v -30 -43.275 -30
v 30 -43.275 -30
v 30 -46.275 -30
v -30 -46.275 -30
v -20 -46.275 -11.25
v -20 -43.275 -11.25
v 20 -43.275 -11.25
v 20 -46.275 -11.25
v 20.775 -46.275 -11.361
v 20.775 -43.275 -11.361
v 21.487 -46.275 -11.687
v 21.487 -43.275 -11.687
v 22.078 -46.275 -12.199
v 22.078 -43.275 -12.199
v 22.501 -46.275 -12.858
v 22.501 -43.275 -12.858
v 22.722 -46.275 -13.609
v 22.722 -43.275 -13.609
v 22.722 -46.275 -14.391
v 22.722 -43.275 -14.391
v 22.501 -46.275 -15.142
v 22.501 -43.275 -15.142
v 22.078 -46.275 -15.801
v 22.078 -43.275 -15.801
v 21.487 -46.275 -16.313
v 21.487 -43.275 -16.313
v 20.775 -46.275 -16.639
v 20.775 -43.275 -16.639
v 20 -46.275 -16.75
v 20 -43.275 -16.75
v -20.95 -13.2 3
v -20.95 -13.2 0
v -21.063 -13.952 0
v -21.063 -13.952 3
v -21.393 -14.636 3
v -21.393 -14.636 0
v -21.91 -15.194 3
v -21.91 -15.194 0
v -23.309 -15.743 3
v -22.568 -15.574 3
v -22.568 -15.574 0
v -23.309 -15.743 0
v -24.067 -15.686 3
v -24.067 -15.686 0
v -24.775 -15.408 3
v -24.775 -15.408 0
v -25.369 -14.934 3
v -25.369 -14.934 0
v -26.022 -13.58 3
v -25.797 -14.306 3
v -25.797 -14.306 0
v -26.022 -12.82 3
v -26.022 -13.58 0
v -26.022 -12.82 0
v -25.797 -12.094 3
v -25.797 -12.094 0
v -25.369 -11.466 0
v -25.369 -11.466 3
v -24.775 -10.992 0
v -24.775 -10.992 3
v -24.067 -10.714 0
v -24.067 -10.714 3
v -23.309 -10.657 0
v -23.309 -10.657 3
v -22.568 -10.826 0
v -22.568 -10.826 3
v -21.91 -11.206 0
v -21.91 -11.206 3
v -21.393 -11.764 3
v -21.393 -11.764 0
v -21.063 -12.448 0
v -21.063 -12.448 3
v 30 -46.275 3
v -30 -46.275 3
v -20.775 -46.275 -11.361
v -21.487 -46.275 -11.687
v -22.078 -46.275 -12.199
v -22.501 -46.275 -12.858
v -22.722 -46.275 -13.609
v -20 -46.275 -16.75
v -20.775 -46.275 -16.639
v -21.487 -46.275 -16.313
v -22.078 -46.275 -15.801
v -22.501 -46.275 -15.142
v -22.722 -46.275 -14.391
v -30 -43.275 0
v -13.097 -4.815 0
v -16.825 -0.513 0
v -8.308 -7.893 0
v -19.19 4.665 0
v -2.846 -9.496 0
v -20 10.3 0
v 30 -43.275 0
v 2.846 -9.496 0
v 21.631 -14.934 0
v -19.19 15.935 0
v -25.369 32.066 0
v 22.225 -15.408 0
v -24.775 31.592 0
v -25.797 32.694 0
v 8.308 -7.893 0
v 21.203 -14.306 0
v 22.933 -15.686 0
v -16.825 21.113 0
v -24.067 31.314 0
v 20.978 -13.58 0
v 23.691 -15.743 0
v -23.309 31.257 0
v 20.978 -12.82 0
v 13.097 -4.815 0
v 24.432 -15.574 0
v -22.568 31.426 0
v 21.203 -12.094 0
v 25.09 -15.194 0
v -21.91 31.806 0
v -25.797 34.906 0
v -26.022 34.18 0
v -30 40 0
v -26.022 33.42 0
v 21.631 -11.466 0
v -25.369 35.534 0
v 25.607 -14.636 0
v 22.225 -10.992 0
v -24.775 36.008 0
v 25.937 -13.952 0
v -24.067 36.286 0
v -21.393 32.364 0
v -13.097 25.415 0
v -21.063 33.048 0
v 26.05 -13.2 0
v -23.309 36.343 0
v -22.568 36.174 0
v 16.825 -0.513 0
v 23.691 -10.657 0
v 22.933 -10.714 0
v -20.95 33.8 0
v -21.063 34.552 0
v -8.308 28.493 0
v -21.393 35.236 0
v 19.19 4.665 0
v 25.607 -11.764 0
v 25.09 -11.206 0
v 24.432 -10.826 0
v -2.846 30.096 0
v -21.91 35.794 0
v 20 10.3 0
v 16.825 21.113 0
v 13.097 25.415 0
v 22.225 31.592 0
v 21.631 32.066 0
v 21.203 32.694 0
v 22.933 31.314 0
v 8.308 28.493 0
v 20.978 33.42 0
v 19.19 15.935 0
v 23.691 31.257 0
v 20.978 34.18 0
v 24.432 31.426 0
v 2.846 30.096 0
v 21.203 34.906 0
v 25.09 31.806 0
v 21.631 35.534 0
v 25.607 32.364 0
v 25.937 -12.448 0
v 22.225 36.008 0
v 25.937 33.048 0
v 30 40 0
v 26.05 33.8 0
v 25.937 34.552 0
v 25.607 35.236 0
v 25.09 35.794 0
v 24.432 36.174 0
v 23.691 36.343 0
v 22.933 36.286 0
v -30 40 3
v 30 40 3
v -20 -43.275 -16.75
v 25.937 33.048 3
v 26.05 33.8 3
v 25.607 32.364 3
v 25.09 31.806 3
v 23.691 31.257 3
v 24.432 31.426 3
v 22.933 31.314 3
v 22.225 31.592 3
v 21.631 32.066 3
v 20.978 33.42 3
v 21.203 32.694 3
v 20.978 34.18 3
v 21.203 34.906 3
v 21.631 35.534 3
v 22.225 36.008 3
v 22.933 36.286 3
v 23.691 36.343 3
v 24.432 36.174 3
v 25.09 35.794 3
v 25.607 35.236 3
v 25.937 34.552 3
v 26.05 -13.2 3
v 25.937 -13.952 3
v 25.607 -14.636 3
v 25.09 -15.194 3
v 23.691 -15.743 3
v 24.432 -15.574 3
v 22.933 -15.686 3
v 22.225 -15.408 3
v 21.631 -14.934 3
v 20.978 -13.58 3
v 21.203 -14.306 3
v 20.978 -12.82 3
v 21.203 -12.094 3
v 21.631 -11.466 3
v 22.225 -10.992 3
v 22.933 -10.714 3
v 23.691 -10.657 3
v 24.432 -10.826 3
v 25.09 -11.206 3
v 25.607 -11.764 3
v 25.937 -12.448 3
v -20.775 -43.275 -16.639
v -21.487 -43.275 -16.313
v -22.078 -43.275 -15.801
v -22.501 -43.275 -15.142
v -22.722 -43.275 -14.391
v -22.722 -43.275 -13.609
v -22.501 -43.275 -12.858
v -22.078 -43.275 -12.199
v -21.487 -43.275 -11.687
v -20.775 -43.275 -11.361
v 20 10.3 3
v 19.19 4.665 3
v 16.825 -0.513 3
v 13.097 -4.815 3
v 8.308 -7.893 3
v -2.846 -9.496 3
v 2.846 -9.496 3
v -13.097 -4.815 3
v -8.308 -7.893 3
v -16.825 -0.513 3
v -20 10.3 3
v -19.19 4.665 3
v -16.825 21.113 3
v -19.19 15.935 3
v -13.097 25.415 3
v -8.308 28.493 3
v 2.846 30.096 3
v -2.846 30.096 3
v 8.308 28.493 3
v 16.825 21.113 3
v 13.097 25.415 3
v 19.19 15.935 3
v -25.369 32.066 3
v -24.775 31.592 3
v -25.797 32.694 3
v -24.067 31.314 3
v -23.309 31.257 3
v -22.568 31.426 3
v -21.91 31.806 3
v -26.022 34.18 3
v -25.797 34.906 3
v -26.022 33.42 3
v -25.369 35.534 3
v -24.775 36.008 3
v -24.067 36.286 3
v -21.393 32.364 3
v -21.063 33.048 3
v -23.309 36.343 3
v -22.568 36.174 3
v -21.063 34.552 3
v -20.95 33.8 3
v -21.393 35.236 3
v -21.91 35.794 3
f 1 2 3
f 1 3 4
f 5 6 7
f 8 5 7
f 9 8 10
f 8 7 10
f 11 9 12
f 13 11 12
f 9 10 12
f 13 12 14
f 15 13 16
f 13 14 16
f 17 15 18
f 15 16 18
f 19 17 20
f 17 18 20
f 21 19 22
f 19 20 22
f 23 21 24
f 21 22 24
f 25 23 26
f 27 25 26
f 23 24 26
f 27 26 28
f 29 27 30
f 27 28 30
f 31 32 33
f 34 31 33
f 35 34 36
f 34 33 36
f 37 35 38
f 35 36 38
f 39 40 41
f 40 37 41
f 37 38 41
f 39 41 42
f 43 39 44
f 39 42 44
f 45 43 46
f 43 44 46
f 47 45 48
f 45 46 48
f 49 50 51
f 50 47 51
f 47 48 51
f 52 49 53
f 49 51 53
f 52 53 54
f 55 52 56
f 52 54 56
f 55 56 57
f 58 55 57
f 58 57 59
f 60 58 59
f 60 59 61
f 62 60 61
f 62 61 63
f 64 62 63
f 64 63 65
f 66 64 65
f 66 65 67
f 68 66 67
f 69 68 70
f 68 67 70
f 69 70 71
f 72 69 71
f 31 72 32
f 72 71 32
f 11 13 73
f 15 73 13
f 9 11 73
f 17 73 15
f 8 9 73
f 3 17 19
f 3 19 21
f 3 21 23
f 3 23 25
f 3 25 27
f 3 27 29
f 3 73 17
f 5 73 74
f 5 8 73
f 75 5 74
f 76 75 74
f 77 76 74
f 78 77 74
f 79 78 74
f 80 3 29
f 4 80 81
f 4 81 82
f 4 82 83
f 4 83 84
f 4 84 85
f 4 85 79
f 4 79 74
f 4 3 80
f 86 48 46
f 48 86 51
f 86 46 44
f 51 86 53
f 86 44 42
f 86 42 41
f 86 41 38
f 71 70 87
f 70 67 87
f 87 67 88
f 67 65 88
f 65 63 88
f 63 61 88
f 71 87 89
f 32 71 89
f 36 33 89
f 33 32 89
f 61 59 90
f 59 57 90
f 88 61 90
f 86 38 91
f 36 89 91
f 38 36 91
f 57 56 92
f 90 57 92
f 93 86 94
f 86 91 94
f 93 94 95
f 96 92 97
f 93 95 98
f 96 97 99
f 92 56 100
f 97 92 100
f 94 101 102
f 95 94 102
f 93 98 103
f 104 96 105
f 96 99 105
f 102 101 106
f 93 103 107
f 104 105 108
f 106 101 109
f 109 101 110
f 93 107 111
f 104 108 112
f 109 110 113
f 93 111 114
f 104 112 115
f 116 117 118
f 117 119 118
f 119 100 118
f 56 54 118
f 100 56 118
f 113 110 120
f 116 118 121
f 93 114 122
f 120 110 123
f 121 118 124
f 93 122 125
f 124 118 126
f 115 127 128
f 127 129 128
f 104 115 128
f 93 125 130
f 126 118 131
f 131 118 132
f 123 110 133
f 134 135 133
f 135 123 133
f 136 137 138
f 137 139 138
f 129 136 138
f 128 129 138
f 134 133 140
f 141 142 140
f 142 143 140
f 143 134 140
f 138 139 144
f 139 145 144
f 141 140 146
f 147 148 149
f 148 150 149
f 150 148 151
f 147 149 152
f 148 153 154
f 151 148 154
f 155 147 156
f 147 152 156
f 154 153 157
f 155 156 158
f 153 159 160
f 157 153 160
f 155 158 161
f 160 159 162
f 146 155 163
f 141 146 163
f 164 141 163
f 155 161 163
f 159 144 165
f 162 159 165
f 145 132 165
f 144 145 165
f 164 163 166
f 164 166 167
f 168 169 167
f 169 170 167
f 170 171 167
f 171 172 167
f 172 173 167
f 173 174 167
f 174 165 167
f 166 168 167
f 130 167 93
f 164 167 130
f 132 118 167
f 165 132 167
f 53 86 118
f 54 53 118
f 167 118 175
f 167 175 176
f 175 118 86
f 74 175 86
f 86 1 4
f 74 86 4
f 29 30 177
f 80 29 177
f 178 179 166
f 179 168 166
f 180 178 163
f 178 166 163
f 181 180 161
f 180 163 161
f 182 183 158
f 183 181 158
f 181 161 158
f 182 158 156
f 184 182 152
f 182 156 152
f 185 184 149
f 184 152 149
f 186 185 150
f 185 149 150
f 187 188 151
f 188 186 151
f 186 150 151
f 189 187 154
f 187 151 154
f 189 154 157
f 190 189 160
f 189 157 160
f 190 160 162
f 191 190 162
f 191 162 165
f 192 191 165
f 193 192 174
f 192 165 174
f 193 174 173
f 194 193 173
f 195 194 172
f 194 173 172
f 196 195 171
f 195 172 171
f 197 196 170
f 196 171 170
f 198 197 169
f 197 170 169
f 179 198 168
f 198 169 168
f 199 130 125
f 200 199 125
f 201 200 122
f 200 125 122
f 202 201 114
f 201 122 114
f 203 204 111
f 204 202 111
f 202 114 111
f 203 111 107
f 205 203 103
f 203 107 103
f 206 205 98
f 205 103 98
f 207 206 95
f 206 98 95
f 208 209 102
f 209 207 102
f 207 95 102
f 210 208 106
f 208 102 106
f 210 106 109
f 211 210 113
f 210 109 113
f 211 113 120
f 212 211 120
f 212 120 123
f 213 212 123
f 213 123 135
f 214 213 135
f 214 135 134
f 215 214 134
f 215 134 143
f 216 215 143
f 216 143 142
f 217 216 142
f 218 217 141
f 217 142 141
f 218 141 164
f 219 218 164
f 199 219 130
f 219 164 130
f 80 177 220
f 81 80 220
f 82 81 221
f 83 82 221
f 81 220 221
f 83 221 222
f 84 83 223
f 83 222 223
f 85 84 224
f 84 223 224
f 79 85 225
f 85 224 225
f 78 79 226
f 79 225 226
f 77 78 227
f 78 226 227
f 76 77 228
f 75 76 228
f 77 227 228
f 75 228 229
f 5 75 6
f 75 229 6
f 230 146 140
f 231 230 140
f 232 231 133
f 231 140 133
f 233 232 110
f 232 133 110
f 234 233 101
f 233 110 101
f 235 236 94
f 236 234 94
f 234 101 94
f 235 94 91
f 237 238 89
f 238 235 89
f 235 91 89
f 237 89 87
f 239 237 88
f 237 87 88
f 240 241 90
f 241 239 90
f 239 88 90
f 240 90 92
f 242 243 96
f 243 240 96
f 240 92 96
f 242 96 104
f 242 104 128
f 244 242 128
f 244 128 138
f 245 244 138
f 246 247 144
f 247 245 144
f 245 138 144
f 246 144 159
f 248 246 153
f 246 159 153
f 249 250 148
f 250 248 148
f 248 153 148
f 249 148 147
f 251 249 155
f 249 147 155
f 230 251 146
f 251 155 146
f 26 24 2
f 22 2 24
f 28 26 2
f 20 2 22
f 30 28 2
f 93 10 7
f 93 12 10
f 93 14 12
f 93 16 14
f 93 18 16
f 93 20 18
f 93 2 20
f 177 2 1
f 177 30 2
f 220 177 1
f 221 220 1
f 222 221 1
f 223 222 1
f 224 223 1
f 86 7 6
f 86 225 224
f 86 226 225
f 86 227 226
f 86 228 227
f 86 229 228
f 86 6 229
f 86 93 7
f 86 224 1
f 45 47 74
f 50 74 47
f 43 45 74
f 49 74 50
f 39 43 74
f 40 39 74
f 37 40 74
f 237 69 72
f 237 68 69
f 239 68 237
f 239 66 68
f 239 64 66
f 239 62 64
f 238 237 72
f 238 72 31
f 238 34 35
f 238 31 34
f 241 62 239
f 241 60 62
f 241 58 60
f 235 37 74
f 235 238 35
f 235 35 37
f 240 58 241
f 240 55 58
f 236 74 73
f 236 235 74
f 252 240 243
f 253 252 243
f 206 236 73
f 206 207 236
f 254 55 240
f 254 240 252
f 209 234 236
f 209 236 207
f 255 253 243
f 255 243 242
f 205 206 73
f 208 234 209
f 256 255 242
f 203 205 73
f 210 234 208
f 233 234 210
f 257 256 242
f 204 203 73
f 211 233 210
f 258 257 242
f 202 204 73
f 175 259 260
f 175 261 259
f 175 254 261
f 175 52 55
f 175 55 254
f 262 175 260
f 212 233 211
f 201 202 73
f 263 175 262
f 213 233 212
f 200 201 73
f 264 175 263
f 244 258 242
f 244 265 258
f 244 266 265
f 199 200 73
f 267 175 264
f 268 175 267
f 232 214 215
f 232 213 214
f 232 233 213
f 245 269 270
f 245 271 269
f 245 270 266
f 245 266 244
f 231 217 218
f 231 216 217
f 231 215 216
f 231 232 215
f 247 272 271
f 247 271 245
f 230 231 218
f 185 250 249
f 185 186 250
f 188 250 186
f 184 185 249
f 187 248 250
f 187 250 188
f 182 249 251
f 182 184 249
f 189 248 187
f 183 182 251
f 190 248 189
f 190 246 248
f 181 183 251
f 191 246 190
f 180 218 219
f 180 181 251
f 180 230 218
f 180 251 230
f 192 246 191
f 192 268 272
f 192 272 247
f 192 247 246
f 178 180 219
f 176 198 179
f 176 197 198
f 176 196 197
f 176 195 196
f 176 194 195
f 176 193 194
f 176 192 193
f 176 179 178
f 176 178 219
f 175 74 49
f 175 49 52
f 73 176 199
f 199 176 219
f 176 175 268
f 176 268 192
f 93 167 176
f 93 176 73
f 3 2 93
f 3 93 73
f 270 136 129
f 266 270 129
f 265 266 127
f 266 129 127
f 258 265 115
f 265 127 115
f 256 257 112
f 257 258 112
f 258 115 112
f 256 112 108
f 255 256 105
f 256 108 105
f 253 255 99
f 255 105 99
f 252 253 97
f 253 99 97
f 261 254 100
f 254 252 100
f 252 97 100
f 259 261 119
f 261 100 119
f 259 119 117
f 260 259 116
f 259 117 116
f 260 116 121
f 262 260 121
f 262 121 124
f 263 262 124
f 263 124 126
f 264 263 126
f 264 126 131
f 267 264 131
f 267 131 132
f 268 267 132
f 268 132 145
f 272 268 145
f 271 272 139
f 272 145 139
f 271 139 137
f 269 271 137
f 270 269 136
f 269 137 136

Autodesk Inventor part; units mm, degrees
ref_plane "YZ Plane" through (0, 0, 0) normal (1, 0, 0) x (0, 1, 0)
ref_plane "XZ Plane" through (0, 0, 0) normal (0, 1, 0) x (-1, 0, 0)
ref_plane "XY Plane" through (0, 0, 0) normal (0, 0, 1) x (1, 0, 0)
sketch "Sketch1" plane through (0, 0, 0) normal (0, 0, 1) x (1, 0, 0)
  line L0 (-30, 40) -> (30, 40)
  line L1 (0, 40) -> (0, 10.3) construction
  circle A0 centre (0, 10.3) radius 20
  line L2 (-23.5, -13.2) -> (23.5, -13.2) construction
  line L3 (23.5, -13.2) -> (23.5, 33.8) construction
  line L4 (23.5, 33.8) -> (-23.5, 33.8) construction
  line L5 (-23.5, 33.8) -> (-23.5, -13.2) construction
  line L6 (23.5, -13.2) -> (-23.5, 33.8) construction
  circle A1 centre (-23.5, 33.8) radius 2.55
  circle A2 centre (23.5, 33.8) radius 2.55
  circle A3 centre (-23.5, -13.2) radius 2.55
  circle A4 centre (23.5, -13.2) radius 2.55
  line L7 (0, -46.275) -> (-30, -46.275)
  line L8 (0, -46.275) -> (30, -46.275)
  line L9 (-30, 40) -> (-30, -46.275)
  line L10 (30, 40) -> (30, -46.275)
  point P0 (0, 0)
  dimension "d2" = 29.7
  dimension "d3" = 40
  dimension "d4" = 47
  dimension "d5" = 47
  dimension "d6" = 5.1
  dimension "d7" = 5.1
  dimension "d8" = 5.1
  dimension "d9" = 5.1
  dimension "d12" = 56.575
  dimension "d13" = 30
  dimension "d14" = 30
extrude "Extrusion1" add sketch "Sketch1" along normal blind 3
sketch "Sketch2" plane through (0, 0, 0) normal (0, 0, -1) x (-1, 0, 0)
  line L0 (30, -46.275) -> (-30, -46.275) projected
  line L1 (-30, -46.275) -> (-30, 40) projected
  line L2 (30, -46.275) -> (-30, -46.275)
  line L3 (-30, -46.275) -> (-30, -43.275)
  line L4 (-30, -43.275) -> (30, -43.275)
  line L5 (30, -43.275) -> (30, -46.275)
  point P0 (0, 0)
  dimension "d15" = 3
extrude "Extrusion2" add sketch "Sketch2" along normal blind 30
sketch "Sketch3" plane through (-30, -43.275, 0) normal (0, 1, 0) x (1, 0, 0)
  line L0 (60, -3) -> (0, -3) construction
  line L1 (30, -3) -> (30, 17.57) construction
  line L2 (30, -3) -> (30, 10.43) construction
  line L3 (30, 10.43) -> (30, 17.57) construction
  line L4 (30, 14) -> (65.9748, 14) construction
  line L5 (65.9748, 14) -> (-8.6143, 14) construction
  line L6 (10, 14) -> (50, 14) construction
  line L7 (10, 11.25) -> (50, 11.25)
  line L8 (50, 16.75) -> (10, 16.75)
  arc A0 (10, 16.75) -> (10, 11.25) centre (10, 14) ccw
  arc A1 (50, 11.25) -> (50, 16.75) centre (50, 14) ccw
  point P0 (30, 0)
  dimension "d18" = 20.57
  dimension "d19" = 13.43
  dimension "d20" = 20
  dimension "d21" = 5.5
extrude "Extrusion3" cut sketch "Sketch3" against normal through all
properties part number "Nema23MountPlate" material "Aluminum 6061"
